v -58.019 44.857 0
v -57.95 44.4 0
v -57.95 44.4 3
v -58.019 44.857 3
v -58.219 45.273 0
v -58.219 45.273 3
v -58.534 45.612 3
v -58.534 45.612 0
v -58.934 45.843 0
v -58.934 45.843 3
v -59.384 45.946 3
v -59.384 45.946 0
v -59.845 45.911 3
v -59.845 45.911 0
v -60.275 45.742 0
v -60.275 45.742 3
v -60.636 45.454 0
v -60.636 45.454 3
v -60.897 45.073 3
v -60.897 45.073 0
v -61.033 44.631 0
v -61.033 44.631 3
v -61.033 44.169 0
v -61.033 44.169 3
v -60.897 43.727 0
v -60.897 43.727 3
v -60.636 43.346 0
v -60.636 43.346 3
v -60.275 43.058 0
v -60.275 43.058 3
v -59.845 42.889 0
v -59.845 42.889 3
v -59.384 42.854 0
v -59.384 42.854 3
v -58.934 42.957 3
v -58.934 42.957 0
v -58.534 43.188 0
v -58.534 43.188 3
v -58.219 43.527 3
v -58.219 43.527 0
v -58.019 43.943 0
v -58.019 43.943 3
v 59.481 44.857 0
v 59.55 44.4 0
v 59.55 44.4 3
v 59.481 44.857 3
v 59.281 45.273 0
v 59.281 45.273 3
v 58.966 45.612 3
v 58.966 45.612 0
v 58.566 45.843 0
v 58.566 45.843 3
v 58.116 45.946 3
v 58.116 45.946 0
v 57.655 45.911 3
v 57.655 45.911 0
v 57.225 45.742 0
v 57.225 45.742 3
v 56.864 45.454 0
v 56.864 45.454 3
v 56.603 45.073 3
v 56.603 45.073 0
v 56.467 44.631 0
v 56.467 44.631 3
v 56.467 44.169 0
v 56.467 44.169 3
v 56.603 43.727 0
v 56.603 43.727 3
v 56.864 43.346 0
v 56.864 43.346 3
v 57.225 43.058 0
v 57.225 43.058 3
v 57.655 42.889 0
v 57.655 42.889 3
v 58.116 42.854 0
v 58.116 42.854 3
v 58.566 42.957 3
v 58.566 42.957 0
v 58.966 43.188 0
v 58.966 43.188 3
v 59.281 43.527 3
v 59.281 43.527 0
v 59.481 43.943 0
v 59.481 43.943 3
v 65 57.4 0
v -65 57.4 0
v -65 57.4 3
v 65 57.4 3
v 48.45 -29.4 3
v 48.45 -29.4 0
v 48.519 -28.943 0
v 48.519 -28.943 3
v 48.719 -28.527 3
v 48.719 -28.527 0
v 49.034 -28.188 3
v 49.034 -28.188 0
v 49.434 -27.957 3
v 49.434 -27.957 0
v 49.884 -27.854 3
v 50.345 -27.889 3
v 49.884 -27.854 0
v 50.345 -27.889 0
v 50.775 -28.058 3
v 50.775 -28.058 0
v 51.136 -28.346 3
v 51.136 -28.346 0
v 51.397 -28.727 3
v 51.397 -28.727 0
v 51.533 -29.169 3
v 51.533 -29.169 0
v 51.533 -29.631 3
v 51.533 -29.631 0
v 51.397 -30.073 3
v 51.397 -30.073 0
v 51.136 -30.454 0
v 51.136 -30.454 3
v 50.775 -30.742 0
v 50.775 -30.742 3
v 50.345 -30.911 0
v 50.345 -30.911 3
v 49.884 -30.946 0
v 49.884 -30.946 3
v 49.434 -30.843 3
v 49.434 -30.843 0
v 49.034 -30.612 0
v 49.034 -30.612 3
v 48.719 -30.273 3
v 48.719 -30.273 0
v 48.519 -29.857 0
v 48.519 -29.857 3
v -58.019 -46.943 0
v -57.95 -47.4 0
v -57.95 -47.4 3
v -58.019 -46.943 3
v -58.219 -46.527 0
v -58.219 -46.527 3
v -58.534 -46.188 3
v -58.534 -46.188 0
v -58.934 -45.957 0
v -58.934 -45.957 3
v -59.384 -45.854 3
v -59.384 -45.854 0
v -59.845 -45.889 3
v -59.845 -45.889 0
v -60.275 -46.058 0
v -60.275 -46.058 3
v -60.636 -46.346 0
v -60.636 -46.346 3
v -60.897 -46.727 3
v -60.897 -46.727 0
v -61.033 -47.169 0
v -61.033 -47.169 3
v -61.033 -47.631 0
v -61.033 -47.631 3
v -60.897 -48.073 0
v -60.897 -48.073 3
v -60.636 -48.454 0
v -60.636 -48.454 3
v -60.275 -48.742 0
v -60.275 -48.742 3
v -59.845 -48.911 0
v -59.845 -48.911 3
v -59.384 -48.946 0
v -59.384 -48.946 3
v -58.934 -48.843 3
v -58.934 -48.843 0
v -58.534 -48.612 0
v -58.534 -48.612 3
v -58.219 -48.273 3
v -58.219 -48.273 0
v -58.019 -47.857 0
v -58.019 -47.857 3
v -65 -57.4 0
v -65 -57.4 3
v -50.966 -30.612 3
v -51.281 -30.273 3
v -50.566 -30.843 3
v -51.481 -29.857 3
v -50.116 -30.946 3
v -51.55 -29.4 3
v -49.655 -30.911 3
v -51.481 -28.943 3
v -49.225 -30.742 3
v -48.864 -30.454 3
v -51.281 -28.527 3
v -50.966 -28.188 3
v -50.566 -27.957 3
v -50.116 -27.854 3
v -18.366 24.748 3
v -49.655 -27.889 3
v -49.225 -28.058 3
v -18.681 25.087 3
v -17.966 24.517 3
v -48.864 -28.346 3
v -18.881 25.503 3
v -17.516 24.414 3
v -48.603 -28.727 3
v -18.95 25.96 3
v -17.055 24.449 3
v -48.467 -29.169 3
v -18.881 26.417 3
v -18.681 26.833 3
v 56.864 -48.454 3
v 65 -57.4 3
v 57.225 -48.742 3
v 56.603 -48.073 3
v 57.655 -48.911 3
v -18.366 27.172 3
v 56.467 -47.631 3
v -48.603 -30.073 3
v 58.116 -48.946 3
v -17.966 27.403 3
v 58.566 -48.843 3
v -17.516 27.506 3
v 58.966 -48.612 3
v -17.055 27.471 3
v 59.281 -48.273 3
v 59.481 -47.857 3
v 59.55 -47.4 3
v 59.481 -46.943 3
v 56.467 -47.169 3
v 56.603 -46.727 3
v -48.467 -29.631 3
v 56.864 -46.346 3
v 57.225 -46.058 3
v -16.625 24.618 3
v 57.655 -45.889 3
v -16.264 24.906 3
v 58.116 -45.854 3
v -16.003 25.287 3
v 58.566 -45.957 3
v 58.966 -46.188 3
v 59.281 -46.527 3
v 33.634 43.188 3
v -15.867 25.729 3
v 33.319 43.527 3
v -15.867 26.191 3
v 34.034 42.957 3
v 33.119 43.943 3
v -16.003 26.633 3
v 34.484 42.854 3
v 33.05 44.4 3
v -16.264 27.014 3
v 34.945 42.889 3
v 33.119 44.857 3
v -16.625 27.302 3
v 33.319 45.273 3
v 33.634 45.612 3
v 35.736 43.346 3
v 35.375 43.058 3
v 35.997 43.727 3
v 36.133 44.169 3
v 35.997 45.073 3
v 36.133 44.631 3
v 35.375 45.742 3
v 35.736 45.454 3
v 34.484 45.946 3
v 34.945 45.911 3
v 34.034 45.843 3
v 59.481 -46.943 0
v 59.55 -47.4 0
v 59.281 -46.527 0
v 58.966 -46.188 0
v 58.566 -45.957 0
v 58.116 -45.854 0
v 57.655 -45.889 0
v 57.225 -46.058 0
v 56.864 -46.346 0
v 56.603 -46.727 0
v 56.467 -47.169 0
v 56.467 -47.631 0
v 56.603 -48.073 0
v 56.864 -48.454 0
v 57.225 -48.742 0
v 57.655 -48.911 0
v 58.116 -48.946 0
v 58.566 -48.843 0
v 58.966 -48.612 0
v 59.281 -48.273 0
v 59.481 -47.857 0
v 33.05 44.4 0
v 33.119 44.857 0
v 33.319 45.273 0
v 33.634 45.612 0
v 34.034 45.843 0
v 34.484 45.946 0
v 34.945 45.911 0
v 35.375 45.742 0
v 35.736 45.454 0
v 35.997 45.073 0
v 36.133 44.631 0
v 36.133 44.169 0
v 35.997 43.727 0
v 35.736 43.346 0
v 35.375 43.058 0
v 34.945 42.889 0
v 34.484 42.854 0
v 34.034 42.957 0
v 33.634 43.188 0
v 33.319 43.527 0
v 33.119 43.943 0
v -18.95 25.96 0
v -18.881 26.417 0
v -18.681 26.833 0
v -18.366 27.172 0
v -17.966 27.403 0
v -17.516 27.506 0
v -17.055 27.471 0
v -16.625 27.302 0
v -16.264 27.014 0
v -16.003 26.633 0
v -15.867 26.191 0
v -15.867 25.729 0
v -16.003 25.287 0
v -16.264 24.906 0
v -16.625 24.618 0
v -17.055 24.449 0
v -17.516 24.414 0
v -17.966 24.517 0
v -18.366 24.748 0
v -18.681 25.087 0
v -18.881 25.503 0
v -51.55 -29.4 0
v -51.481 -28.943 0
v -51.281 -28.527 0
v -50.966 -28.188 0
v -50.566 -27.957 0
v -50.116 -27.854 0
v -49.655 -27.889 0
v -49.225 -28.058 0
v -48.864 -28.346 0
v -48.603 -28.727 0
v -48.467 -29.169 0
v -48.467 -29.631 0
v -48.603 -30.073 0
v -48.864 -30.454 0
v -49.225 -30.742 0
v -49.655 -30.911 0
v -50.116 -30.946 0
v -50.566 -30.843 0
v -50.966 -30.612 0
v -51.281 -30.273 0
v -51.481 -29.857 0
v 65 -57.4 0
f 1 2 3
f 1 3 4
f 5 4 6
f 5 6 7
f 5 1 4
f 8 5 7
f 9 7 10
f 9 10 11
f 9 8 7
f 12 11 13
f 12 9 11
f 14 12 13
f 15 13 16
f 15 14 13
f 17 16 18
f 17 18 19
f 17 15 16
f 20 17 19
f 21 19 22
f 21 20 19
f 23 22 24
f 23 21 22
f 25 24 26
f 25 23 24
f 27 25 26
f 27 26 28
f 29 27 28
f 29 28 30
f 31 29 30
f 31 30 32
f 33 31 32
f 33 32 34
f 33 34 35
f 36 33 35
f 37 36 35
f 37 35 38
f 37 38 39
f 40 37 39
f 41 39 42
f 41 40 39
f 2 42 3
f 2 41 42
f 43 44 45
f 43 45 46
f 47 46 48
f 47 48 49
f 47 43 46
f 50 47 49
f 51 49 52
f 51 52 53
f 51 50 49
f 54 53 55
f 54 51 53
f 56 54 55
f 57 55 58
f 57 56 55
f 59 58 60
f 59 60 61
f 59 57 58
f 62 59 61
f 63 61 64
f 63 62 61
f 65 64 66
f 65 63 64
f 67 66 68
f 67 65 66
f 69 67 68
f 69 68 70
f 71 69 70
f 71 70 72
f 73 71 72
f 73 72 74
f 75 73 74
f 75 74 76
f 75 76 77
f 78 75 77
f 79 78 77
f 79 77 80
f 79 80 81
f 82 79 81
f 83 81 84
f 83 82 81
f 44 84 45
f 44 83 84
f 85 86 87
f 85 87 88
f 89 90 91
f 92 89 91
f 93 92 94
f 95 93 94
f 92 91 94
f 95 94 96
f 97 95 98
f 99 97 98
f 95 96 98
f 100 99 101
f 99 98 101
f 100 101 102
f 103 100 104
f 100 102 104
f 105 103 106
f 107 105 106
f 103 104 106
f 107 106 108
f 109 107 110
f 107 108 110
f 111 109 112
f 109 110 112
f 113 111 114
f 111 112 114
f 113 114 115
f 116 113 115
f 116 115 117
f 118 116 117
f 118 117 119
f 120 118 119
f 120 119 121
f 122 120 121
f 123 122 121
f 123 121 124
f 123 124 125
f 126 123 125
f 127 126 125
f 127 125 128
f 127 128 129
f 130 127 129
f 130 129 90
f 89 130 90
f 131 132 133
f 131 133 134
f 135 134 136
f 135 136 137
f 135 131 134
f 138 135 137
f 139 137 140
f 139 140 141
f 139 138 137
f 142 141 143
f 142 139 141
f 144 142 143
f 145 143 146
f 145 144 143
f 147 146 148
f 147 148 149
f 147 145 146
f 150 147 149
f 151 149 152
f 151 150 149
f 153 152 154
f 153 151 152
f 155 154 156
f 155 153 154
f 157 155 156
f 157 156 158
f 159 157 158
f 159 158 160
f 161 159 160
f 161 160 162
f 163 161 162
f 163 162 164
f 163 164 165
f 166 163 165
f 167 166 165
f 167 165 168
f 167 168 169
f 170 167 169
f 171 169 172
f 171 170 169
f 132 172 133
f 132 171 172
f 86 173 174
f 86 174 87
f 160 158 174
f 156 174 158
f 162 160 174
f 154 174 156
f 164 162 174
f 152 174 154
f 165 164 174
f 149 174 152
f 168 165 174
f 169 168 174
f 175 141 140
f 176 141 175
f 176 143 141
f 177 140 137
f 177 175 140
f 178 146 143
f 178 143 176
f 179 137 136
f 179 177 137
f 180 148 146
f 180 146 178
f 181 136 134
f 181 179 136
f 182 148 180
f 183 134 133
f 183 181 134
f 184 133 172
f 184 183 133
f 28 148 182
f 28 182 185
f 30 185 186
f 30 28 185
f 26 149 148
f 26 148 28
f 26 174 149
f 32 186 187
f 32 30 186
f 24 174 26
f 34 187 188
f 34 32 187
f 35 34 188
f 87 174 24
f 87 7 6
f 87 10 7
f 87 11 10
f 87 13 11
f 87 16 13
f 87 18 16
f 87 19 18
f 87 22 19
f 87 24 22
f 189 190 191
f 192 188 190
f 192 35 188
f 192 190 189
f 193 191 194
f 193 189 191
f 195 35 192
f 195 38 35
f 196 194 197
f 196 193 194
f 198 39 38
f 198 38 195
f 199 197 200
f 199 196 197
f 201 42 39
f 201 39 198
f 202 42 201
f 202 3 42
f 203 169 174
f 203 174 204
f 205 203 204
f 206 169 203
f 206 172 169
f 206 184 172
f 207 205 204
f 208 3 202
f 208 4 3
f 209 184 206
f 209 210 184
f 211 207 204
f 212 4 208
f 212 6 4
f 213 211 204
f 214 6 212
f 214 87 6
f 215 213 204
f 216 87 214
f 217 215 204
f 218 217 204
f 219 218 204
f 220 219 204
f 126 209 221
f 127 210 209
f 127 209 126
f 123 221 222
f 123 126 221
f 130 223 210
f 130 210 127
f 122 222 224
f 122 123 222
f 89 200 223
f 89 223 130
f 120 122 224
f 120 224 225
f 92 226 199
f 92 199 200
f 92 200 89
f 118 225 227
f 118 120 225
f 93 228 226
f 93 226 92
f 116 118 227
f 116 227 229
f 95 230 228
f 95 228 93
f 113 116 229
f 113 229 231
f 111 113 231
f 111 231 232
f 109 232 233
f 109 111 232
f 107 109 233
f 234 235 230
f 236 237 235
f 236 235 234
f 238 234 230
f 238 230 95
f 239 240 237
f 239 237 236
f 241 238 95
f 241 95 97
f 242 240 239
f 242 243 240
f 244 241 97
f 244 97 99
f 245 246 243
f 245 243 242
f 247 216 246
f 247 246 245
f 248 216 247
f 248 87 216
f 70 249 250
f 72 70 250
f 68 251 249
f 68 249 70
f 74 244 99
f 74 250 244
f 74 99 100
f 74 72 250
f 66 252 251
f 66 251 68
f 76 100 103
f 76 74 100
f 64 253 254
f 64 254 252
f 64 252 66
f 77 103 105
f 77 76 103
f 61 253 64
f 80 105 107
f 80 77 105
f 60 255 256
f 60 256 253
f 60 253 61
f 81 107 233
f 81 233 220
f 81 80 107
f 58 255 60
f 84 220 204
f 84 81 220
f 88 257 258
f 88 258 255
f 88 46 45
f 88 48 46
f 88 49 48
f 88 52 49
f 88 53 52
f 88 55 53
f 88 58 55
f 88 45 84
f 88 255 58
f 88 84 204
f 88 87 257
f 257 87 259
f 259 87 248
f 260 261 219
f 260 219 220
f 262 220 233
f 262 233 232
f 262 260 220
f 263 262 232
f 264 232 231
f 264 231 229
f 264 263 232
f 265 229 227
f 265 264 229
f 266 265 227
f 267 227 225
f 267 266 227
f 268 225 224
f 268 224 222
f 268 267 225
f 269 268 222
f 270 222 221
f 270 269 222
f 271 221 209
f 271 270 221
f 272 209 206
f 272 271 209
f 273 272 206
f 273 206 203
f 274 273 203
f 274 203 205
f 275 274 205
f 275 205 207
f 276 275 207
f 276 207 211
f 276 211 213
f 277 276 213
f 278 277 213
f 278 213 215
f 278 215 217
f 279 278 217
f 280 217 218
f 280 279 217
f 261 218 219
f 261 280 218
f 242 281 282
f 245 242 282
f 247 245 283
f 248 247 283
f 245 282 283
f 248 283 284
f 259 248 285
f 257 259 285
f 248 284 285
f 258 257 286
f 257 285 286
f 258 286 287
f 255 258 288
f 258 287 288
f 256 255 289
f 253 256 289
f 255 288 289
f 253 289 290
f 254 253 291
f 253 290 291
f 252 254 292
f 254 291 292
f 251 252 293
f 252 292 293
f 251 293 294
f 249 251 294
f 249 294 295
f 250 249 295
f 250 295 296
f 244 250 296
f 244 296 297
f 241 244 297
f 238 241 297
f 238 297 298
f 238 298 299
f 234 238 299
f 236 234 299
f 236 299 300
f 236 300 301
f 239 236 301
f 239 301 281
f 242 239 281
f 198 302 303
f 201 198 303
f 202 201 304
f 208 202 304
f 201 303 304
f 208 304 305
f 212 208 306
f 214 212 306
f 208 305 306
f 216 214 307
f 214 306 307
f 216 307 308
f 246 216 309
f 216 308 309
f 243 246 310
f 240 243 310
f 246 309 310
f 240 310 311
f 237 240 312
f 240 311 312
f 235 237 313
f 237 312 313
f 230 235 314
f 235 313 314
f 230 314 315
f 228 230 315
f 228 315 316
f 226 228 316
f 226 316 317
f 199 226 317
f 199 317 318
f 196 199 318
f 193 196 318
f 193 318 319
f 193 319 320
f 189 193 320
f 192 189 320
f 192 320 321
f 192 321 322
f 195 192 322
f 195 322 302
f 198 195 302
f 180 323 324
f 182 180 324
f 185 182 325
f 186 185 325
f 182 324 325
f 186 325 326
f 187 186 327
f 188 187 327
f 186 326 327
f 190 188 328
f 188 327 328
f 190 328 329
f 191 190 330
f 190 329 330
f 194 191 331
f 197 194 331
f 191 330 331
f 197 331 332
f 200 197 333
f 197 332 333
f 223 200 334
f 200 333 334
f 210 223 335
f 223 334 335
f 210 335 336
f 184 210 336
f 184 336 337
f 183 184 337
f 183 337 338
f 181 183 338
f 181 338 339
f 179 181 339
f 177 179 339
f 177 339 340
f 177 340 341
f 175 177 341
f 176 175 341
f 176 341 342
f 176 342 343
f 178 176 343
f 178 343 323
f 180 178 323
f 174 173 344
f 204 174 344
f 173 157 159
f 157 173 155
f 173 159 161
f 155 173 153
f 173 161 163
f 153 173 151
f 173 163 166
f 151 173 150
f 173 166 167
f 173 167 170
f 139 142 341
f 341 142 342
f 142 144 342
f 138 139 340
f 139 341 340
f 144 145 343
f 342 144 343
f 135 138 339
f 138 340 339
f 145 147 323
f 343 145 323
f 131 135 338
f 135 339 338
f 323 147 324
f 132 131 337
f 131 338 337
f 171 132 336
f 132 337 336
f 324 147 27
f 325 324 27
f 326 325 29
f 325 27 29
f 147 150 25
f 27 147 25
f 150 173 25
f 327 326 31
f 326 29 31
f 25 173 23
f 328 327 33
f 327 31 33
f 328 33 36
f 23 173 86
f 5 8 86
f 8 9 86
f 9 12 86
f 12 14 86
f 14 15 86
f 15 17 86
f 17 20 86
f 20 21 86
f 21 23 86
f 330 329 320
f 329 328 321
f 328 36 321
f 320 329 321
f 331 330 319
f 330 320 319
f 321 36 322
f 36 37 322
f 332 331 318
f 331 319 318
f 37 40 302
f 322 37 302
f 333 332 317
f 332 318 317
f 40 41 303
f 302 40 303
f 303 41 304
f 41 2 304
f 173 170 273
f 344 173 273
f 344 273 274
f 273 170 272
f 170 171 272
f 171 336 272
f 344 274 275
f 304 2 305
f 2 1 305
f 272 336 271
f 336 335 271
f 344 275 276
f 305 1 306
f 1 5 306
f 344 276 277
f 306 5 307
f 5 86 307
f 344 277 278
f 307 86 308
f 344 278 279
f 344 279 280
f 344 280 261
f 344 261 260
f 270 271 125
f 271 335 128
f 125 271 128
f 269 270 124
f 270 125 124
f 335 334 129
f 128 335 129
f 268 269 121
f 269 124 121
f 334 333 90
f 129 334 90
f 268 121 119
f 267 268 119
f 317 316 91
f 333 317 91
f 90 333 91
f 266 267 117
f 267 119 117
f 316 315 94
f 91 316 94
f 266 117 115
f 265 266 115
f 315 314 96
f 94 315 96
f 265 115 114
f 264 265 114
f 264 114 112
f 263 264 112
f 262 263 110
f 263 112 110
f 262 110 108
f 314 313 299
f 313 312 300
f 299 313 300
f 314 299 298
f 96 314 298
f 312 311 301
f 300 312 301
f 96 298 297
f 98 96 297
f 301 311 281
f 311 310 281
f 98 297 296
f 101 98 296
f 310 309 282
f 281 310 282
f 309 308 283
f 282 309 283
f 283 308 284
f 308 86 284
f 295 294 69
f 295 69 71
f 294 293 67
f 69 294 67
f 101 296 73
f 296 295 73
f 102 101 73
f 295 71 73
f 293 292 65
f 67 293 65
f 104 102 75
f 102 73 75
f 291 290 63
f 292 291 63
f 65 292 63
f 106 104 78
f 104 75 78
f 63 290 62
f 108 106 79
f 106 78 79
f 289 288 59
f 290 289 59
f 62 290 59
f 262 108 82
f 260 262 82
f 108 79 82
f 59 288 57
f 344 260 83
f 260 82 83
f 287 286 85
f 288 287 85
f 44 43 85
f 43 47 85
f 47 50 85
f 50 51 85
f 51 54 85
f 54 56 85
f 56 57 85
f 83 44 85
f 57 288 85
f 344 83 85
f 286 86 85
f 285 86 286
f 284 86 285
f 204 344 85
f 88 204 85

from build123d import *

# Parameters (mm, degrees)
SKETCH1_W           = 130
SKETCH1_H           = 114.8
SKETCH1_R           = 1.55
BOSS_EXTRUDE1_DEPTH = 3
CUT_EXTRUDE1_REACH  = 5
SKETCH3_R           = 1.55
CUT_EXTRUDE2_REACH  = 5
SKETCH4_R           = 1.55


with BuildPart() as part:
    # Sketch1 → Boss-Extrude1 (new body)
    with BuildSketch(Plane.XY):
        Rectangle(SKETCH1_W, SKETCH1_H)
        with Locations((-59.5, 44.4)):
            Circle(SKETCH1_R, mode=Mode.SUBTRACT)
        with Locations((58, 44.4)):
            Circle(SKETCH1_R, mode=Mode.SUBTRACT)
        with Locations((58, -47.4)):
            Circle(SKETCH1_R, mode=Mode.SUBTRACT)
        with Locations((-59.5, -47.4)):
            Circle(SKETCH1_R, mode=Mode.SUBTRACT)
    extrude(amount=BOSS_EXTRUDE1_DEPTH)

    # Sketch3 → Cut-Extrude1 (cut, up to next)
    with BuildSketch(Plane(origin=(0, 0, 0), x_dir=(-1, 0, 0), z_dir=(0, 0, -1)), mode=Mode.PRIVATE) as cut_extrude1_sk1:
        with Locations((-50, -29.4)):
            Circle(SKETCH3_R)
    cut_extrude1_tool1 = extrude(cut_extrude1_sk1.sketch, amount=-CUT_EXTRUDE1_REACH, mode=Mode.PRIVATE) & part.part
    add(cut_extrude1_tool1.solids().sort_by_distance((50, -29.4, 0))[0], mode=Mode.SUBTRACT)
    # Sketch3 → Cut-Extrude1 (cut, up to next)
    with BuildSketch(Plane(origin=(0, 0, 0), x_dir=(-1, 0, 0), z_dir=(0, 0, -1)), mode=Mode.PRIVATE) as cut_extrude1_sk2:
        with Locations((50, -29.4)):
            Circle(SKETCH3_R)
    cut_extrude1_tool2 = extrude(cut_extrude1_sk2.sketch, amount=-CUT_EXTRUDE1_REACH, mode=Mode.PRIVATE) & part.part
    add(cut_extrude1_tool2.solids().sort_by_distance((-50, -29.4, 0))[0], mode=Mode.SUBTRACT)

    # Sketch4 → Cut-Extrude2 (cut, up to next)
    with BuildSketch(Plane(origin=(0, 0, 0), x_dir=(-1, 0, 0), z_dir=(0, 0, -1)), mode=Mode.PRIVATE) as cut_extrude2_sk1:
        with Locations((-34.6, 44.4)):
            Circle(SKETCH4_R)
    cut_extrude2_tool1 = extrude(cut_extrude2_sk1.sketch, amount=-CUT_EXTRUDE2_REACH, mode=Mode.PRIVATE) & part.part
    add(cut_extrude2_tool1.solids().sort_by_distance((34.6, 44.4, 0))[0], mode=Mode.SUBTRACT)
    # Sketch4 → Cut-Extrude2 (cut, up to next)
    with BuildSketch(Plane(origin=(0, 0, 0), x_dir=(-1, 0, 0), z_dir=(0, 0, -1)), mode=Mode.PRIVATE) as cut_extrude2_sk2:
        with Locations((17.4, 25.96)):
            Circle(SKETCH4_R)
    cut_extrude2_tool2 = extrude(cut_extrude2_sk2.sketch, amount=-CUT_EXTRUDE2_REACH, mode=Mode.PRIVATE) & part.part
    add(cut_extrude2_tool2.solids().sort_by_distance((-17.4, 25.96, 0))[0], mode=Mode.SUBTRACT)


solid = part.part
